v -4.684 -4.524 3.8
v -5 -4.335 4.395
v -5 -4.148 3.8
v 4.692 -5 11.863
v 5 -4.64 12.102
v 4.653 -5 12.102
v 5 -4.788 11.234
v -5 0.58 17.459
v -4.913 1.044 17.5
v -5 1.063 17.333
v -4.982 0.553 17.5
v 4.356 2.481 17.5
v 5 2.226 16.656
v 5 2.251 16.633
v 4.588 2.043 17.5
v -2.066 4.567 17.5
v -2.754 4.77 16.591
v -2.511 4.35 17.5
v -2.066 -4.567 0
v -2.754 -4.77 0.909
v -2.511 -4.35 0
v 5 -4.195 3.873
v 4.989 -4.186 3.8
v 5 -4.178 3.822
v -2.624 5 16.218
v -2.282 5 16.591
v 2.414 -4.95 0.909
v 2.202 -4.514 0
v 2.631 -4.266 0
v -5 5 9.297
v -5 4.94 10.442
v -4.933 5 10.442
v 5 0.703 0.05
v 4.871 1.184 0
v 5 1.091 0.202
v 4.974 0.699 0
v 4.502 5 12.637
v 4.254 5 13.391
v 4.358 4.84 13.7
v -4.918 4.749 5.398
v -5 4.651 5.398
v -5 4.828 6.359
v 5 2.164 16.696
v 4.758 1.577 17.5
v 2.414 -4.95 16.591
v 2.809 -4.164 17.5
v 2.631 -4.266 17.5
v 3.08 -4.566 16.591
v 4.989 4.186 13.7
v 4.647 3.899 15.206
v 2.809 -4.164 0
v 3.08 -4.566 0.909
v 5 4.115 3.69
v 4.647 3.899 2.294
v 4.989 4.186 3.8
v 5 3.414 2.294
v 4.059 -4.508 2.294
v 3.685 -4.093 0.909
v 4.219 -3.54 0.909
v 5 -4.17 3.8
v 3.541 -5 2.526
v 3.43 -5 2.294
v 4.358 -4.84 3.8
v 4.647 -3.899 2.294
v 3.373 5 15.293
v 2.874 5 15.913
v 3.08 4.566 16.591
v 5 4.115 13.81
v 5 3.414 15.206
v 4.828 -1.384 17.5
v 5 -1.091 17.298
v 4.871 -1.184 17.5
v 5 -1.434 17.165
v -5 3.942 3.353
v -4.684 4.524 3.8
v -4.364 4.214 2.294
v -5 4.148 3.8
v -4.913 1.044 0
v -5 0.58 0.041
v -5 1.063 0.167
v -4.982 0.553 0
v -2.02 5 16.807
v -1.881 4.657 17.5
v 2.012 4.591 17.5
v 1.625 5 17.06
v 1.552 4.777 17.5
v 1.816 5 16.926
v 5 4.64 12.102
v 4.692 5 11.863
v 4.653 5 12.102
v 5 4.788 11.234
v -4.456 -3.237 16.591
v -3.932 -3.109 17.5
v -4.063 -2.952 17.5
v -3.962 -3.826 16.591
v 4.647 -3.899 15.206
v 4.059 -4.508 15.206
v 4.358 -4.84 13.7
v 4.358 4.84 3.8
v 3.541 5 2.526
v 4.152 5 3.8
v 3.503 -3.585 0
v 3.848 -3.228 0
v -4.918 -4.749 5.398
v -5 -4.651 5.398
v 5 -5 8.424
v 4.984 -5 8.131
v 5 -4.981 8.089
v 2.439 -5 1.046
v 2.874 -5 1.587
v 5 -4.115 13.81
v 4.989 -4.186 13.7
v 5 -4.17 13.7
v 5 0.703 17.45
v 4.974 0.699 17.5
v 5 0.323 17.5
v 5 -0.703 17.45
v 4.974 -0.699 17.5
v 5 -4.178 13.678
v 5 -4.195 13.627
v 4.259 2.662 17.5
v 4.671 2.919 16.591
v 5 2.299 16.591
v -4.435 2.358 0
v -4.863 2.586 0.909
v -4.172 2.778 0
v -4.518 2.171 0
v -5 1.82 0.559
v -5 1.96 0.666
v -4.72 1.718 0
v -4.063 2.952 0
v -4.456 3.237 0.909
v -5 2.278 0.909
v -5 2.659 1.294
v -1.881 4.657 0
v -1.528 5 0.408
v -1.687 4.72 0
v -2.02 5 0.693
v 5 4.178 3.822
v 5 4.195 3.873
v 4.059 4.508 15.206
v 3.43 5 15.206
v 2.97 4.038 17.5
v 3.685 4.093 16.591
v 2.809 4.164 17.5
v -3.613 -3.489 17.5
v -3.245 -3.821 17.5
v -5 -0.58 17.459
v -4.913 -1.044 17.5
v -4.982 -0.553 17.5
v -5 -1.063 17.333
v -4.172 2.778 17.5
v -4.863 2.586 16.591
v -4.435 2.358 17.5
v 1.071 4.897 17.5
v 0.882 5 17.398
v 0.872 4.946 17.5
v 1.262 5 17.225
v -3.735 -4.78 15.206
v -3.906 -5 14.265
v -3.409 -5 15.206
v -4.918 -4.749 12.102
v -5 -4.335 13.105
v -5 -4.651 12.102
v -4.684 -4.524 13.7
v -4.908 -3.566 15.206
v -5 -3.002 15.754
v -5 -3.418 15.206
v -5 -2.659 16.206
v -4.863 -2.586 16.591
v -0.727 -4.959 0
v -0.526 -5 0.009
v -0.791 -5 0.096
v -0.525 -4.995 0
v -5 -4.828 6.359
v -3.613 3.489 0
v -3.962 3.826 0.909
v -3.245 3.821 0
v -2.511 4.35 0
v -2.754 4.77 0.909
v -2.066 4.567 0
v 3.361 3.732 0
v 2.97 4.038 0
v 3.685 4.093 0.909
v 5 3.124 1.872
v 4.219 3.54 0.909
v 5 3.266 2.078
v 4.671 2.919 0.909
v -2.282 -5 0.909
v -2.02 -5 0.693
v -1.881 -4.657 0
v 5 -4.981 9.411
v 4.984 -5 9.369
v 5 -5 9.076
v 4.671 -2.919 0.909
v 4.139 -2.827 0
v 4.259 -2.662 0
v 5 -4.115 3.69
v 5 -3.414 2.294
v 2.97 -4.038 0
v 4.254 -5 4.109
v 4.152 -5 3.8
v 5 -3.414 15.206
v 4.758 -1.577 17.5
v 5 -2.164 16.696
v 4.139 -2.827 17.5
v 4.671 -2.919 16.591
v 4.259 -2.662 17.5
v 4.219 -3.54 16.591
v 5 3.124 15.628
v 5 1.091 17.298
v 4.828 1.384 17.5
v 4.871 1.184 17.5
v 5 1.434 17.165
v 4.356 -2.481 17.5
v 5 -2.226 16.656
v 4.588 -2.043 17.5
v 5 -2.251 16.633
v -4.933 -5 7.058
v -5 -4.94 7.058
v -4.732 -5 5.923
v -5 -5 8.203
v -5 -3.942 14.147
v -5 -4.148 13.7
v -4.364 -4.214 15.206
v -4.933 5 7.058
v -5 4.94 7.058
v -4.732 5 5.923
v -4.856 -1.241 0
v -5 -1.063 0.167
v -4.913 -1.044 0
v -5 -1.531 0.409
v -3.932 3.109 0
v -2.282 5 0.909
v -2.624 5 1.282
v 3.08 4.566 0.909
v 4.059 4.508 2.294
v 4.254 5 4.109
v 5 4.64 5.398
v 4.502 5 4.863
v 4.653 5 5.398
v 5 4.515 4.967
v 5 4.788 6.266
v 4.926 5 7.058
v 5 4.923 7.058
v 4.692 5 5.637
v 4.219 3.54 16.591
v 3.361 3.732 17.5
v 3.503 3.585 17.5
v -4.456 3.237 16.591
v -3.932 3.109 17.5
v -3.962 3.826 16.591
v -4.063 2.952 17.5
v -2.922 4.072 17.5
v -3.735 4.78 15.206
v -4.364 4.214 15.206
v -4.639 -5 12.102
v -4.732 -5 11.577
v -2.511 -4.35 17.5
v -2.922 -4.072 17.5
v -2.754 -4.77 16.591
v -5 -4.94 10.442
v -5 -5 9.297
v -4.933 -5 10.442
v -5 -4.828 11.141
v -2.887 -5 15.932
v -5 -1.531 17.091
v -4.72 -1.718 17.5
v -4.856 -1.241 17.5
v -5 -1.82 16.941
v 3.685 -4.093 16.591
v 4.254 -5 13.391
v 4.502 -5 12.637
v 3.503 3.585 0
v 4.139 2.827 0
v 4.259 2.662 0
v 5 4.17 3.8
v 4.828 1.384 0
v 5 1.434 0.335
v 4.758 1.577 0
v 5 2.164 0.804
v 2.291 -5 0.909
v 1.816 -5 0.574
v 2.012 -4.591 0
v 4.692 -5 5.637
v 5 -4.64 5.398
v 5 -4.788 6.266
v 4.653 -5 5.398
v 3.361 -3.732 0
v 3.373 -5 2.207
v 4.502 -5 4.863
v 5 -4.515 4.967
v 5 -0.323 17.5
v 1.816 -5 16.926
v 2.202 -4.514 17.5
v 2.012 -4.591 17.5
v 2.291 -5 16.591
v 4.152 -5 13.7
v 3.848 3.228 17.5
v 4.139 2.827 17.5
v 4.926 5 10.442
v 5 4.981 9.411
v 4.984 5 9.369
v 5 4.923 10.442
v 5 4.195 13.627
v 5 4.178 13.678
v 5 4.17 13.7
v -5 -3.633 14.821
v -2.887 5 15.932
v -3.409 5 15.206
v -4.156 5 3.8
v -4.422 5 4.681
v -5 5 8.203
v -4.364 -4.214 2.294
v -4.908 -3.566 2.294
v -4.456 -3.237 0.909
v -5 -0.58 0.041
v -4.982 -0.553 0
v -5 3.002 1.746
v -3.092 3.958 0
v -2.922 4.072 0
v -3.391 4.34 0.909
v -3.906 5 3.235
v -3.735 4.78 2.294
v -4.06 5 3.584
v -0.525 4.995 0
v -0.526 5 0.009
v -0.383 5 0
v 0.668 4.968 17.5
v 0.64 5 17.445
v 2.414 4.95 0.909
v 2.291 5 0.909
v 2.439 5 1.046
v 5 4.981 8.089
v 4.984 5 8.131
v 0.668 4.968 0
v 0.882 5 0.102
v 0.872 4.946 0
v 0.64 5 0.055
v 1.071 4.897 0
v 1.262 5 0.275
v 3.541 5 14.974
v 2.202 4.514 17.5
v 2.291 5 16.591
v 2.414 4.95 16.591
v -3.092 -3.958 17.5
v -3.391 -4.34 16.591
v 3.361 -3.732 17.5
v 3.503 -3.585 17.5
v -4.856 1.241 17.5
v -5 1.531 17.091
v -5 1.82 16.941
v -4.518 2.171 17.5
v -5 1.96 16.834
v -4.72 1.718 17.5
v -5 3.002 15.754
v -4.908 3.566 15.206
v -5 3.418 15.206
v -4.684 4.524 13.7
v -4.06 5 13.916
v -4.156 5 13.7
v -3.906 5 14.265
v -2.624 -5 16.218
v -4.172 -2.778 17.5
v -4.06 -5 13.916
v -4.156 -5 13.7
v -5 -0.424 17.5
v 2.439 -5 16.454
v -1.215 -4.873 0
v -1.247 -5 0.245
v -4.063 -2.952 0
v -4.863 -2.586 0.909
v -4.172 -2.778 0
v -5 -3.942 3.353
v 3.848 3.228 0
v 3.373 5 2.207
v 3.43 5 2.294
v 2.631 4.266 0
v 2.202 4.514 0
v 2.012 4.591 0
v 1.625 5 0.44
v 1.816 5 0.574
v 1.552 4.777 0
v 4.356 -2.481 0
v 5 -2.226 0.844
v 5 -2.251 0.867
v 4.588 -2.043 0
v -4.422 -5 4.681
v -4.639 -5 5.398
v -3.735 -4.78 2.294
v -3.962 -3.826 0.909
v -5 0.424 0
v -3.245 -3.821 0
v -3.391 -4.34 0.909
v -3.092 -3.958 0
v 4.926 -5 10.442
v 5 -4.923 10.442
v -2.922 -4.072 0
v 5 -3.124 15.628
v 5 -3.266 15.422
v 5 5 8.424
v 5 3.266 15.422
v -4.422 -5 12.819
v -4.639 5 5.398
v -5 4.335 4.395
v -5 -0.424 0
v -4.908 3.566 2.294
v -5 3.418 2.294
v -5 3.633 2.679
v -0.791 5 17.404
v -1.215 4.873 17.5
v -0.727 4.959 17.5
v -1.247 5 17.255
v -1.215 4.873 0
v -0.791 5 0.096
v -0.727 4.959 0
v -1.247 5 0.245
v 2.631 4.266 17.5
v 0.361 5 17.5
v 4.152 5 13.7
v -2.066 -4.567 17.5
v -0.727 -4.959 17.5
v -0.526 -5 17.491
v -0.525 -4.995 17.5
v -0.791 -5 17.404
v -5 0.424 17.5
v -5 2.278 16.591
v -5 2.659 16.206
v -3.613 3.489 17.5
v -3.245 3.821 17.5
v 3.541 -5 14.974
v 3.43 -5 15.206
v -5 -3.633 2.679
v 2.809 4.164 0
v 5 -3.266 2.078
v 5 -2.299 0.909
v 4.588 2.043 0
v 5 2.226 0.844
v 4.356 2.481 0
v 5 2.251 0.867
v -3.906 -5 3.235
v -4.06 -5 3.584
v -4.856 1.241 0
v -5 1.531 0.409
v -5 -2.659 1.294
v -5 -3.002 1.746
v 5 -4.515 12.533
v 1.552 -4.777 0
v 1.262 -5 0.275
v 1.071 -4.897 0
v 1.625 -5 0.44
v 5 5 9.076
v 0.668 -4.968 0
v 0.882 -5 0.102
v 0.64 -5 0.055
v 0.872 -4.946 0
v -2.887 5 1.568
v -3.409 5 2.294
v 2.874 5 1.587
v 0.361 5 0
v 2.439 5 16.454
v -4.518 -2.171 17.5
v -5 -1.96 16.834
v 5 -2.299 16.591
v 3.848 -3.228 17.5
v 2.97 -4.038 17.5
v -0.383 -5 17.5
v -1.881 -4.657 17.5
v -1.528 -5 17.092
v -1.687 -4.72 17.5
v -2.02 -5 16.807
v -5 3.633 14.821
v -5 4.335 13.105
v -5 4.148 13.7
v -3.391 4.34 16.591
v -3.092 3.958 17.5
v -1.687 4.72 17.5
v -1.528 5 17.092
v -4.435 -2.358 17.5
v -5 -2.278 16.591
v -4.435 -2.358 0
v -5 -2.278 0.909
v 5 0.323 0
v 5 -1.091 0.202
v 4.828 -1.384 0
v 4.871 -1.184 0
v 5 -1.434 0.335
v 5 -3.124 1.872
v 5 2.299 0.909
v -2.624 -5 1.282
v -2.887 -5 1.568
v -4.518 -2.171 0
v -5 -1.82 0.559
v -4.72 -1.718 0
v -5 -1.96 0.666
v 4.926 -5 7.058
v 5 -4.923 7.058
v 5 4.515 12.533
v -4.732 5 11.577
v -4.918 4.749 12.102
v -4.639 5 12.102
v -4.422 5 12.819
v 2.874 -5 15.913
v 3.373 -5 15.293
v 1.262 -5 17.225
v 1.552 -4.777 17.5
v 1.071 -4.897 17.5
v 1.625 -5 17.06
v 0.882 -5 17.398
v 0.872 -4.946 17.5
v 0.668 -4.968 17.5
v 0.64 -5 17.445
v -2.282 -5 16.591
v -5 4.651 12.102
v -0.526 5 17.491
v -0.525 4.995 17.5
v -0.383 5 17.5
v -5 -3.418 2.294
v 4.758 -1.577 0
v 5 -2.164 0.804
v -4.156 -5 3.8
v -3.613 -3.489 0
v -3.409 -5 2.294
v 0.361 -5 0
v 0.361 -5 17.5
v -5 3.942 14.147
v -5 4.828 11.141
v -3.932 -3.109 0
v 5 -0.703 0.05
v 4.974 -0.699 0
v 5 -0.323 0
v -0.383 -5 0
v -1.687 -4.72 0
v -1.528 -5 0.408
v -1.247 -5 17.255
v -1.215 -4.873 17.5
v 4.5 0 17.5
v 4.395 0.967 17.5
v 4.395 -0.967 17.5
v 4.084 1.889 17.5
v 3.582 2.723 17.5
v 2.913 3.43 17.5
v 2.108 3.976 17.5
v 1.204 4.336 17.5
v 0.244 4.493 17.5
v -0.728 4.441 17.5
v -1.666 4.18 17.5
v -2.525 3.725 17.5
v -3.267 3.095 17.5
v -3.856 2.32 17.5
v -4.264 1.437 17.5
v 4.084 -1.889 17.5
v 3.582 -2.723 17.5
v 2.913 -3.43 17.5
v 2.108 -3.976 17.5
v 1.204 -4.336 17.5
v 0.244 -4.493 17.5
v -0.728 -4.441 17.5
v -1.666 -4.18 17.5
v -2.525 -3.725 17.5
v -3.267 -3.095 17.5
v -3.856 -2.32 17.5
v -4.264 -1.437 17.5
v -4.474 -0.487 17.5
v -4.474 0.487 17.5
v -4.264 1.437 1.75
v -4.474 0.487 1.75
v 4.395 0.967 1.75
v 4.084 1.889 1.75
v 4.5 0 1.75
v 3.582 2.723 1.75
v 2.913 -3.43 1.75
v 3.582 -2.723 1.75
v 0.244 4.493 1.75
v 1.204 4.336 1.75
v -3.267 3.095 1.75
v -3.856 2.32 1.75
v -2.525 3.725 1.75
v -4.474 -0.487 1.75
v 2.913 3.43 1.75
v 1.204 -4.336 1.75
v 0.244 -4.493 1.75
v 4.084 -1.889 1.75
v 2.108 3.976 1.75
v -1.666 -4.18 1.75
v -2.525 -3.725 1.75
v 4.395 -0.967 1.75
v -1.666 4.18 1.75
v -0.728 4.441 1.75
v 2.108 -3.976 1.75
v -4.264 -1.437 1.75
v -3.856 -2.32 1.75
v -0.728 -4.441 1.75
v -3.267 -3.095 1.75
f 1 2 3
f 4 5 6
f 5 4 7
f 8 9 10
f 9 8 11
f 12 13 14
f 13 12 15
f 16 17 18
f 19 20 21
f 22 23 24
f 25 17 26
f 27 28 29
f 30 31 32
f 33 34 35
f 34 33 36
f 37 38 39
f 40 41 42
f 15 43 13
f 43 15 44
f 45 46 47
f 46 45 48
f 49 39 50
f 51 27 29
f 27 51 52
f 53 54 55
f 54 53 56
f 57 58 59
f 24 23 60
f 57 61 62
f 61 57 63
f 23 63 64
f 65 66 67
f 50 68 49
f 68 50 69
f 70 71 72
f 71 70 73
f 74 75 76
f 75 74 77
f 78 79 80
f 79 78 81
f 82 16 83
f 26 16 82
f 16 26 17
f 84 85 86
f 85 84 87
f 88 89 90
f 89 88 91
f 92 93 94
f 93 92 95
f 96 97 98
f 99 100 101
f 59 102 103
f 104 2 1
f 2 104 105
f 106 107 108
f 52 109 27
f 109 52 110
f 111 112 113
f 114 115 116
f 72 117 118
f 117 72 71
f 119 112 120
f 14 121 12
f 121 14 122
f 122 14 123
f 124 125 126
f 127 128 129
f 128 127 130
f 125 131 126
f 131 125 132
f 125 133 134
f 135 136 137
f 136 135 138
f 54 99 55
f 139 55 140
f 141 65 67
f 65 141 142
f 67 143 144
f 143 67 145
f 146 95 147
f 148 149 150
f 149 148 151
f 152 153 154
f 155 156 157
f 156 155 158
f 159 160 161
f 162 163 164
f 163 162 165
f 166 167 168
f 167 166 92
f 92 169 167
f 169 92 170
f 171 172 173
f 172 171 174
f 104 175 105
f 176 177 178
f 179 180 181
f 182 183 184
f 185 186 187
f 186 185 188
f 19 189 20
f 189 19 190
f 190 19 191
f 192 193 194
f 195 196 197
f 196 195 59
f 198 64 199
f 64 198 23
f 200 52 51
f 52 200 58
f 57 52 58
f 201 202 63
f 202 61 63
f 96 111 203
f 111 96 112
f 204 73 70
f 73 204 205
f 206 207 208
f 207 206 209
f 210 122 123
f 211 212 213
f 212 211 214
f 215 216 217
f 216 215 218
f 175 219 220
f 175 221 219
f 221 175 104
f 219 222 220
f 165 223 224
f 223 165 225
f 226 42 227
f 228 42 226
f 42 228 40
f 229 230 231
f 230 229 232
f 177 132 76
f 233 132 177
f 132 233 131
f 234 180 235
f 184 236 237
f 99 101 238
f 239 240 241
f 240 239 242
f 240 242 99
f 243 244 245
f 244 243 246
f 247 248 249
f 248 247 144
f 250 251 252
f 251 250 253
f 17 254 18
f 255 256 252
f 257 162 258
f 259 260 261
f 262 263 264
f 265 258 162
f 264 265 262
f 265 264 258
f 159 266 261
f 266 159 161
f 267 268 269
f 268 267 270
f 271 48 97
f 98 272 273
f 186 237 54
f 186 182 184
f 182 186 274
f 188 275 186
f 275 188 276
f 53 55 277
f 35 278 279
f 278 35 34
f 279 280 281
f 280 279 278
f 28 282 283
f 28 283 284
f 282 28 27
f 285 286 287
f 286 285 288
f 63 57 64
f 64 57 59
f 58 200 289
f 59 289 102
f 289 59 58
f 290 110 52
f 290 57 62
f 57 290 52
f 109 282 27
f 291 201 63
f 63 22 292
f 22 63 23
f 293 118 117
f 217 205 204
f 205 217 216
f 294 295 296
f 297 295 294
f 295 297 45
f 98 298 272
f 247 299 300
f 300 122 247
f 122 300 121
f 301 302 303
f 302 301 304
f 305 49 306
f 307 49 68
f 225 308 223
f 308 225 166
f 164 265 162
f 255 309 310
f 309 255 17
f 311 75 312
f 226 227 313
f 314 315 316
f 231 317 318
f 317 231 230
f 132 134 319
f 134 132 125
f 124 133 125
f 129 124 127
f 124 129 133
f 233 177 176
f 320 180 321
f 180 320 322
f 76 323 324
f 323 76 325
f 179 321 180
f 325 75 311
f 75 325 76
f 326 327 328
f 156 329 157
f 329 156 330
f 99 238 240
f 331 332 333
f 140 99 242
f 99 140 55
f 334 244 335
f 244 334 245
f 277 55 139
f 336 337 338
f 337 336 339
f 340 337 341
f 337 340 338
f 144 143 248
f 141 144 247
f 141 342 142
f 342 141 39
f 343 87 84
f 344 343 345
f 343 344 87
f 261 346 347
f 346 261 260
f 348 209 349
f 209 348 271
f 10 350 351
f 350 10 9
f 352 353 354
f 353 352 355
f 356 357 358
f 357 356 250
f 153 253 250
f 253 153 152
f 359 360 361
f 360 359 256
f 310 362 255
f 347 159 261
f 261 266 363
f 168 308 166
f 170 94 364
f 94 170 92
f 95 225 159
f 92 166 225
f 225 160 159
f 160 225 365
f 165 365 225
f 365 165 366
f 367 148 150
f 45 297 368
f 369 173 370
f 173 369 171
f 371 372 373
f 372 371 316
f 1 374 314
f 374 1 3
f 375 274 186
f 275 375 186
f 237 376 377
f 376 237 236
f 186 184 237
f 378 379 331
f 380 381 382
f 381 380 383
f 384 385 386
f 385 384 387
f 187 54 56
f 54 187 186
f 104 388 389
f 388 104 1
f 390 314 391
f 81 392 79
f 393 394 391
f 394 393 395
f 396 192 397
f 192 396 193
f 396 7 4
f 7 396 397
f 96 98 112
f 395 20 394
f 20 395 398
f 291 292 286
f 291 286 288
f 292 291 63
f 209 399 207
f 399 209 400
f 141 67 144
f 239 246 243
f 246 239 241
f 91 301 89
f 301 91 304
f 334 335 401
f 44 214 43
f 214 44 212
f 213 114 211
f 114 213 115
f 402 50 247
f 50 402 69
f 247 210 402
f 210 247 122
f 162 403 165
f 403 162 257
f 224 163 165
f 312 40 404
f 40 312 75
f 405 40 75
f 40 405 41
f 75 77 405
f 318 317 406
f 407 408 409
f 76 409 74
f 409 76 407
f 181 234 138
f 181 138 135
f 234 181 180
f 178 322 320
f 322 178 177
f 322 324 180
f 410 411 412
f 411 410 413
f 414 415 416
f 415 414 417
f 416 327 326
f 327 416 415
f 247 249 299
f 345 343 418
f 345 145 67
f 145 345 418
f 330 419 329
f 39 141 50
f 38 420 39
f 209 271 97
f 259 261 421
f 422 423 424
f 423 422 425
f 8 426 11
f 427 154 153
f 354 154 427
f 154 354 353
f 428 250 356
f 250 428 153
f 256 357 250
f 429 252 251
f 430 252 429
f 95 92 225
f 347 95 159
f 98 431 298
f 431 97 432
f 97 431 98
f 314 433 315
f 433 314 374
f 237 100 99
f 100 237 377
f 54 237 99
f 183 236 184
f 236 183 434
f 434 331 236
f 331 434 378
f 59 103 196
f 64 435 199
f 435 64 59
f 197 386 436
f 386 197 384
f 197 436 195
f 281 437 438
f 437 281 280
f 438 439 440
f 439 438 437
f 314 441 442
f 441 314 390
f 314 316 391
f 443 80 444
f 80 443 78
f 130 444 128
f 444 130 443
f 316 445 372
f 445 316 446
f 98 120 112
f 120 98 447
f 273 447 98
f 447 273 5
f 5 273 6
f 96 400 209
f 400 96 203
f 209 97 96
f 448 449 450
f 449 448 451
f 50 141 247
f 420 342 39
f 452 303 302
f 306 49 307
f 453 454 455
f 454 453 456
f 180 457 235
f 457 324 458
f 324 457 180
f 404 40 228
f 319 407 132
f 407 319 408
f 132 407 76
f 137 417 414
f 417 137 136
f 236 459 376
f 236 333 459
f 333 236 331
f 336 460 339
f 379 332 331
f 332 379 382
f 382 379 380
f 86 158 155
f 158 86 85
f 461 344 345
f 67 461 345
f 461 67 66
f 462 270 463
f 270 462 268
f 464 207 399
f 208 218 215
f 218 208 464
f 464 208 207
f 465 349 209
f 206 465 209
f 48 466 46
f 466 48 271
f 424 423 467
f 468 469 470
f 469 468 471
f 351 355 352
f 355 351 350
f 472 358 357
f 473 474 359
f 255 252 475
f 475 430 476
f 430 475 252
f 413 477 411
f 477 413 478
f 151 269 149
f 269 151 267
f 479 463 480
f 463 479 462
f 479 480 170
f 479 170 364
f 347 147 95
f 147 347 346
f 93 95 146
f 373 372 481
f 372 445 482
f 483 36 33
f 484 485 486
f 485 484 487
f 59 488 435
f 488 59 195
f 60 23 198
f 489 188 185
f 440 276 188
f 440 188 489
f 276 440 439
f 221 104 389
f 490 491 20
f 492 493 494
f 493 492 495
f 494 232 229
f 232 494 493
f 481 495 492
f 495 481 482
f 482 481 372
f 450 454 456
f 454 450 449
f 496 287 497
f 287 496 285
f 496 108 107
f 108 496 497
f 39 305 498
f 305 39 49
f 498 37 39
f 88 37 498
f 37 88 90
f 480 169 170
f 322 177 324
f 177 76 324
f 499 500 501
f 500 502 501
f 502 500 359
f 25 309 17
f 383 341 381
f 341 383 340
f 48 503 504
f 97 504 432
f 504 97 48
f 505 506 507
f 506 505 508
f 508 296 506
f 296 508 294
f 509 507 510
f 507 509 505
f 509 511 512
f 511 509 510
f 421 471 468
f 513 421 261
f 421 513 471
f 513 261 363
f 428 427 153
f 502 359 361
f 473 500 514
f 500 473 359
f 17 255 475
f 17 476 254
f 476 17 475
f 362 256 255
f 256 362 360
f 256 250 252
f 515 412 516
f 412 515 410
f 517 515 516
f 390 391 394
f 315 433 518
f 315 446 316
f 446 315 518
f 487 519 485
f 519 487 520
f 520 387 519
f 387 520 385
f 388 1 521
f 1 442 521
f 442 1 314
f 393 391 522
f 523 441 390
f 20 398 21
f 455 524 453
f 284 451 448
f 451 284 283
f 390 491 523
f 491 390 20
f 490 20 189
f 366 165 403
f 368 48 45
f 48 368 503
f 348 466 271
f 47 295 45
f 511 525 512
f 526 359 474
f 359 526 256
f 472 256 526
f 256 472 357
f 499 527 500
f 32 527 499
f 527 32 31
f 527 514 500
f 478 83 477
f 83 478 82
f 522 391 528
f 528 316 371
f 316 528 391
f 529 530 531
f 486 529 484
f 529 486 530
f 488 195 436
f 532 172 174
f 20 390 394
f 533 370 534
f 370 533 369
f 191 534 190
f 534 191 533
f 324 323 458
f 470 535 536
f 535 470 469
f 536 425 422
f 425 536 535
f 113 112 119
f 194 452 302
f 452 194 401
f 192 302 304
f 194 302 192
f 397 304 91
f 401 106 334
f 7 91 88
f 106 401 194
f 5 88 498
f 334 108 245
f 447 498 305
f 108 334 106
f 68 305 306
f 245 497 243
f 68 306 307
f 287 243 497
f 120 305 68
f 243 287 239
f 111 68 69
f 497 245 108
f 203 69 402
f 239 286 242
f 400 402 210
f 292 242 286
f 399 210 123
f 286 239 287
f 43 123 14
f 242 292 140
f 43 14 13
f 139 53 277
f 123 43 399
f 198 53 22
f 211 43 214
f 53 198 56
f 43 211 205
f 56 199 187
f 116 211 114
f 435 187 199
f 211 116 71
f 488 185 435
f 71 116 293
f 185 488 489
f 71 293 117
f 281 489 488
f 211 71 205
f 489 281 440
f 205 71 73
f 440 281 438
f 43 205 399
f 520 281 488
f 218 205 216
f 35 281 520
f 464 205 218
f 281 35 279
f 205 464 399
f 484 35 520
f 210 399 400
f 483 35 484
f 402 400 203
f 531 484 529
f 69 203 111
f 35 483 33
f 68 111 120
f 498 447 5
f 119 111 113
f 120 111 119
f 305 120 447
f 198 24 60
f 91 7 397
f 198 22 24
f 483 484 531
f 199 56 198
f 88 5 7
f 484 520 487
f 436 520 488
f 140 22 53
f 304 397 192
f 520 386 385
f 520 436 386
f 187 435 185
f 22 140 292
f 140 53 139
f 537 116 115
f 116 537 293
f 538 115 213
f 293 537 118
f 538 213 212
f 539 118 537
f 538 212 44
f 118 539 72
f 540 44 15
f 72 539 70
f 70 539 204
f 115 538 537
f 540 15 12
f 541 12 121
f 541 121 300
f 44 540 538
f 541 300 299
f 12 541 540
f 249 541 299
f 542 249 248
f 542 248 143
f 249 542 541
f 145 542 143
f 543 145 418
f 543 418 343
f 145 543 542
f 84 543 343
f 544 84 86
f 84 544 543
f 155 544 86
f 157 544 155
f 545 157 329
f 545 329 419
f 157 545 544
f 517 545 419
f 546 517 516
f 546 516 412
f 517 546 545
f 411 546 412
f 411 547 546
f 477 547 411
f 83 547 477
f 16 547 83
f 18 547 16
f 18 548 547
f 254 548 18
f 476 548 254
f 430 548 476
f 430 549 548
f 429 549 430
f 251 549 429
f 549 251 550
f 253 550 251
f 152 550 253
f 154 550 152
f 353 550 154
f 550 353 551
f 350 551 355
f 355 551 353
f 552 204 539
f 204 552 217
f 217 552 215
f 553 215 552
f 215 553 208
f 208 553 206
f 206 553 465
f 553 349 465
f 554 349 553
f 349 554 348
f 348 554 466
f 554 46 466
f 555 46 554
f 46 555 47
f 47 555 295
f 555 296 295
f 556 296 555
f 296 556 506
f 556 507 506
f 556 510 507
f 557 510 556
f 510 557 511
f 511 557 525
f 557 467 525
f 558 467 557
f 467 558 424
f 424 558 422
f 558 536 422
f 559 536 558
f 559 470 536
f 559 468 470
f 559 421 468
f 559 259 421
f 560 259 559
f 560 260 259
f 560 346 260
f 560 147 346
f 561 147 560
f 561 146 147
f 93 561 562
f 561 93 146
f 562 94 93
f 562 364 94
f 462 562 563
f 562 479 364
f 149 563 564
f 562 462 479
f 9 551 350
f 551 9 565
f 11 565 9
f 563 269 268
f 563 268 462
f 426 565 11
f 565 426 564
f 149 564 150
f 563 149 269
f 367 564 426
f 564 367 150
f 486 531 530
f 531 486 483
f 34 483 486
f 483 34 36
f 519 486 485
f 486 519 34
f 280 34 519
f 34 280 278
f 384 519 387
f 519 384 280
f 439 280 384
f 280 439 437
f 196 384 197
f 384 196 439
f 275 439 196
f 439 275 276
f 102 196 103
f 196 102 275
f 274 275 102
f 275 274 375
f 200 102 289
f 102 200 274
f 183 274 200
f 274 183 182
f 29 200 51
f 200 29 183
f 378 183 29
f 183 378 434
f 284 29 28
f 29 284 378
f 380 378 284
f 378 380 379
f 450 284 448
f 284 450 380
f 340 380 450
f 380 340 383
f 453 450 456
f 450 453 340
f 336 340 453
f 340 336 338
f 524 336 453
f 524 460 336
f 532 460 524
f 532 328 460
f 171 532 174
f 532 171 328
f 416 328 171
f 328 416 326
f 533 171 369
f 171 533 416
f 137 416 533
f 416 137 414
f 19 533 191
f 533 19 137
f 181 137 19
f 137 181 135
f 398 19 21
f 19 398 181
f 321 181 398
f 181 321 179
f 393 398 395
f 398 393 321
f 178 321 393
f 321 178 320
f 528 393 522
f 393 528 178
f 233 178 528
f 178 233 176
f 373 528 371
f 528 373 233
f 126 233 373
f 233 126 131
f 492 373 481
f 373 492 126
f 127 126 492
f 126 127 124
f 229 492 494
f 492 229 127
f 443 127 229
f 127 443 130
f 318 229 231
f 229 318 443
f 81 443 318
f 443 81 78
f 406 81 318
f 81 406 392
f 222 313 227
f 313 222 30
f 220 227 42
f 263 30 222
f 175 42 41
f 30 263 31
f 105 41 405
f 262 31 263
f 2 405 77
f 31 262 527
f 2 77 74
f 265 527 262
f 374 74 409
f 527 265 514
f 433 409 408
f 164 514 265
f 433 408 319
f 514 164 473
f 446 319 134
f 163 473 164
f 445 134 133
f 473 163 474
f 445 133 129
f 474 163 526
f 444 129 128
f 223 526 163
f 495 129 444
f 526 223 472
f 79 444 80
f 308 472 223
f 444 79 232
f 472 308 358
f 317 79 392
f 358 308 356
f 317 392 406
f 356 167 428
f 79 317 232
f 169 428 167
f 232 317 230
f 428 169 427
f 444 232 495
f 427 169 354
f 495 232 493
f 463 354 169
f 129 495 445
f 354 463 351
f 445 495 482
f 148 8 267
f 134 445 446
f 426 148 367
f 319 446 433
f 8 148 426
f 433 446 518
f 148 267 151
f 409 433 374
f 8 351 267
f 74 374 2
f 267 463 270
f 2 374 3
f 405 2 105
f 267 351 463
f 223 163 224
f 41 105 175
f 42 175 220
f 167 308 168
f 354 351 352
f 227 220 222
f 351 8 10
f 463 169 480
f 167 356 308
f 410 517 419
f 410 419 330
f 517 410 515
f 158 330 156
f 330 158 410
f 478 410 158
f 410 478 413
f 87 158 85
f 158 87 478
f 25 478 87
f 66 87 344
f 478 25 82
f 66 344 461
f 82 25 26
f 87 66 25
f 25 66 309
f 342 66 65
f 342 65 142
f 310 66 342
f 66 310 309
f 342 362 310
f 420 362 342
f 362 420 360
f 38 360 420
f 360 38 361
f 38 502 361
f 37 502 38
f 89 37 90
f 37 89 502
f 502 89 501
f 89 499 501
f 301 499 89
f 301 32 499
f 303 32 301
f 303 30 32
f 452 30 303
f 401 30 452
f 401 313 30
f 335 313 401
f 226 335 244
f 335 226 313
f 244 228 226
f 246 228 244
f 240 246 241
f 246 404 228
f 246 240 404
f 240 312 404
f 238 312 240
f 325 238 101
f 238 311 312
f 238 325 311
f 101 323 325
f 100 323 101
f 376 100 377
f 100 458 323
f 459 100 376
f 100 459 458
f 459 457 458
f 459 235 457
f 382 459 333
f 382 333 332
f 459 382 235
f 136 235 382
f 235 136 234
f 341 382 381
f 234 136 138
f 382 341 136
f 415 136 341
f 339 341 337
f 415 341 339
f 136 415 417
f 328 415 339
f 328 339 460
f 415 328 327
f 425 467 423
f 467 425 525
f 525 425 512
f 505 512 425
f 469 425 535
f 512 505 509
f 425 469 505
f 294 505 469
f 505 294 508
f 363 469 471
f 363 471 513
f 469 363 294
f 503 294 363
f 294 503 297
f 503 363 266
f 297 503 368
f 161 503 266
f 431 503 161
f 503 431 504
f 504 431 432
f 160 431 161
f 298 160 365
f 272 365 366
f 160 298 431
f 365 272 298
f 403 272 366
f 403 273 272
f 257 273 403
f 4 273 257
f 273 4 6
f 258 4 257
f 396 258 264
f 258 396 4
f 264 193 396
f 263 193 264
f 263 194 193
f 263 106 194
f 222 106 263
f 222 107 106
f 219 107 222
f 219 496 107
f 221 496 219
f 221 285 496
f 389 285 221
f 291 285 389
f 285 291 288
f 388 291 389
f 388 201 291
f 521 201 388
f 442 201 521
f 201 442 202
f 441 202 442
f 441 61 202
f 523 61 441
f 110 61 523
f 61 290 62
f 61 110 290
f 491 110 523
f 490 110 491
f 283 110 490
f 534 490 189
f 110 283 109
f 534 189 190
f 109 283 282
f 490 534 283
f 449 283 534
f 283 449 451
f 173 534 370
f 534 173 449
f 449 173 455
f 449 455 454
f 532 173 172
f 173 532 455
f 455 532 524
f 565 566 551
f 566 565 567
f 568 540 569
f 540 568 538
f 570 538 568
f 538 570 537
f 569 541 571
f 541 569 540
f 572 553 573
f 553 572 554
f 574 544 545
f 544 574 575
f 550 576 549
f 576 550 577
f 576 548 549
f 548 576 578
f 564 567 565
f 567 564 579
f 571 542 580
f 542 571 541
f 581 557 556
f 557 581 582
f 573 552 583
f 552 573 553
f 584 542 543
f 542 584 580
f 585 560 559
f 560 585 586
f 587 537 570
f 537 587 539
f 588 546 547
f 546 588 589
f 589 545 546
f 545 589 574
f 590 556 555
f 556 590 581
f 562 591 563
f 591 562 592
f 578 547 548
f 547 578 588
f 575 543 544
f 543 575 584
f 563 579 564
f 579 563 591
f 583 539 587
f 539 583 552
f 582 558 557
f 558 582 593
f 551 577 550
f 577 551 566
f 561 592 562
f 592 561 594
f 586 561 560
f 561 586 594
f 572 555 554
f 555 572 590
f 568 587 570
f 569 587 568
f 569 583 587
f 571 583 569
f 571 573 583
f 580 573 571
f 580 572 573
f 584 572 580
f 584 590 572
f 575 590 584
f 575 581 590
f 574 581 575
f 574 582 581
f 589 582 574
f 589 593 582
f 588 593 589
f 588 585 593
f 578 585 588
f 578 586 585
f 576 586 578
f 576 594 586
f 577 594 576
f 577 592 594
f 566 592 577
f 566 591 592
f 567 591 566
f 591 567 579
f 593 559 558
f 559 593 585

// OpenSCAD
/*
The code is automatically
generated from [test01.dats]
*/

$fa=0.1; $fs=0.1;

scale([10.00, 10.00, 17.50])
{
  translate([0.00, 0.00, 0.50])
  {
    difference()
    {
      intersection()
      {
        sphere(0.71);
        cube(1.00, center=true);
      }
      translate([0.00, 0.00, 0.10])
      {
        cylinder(h=1.00, r=0.45, center=true);
      }
    }
  }
}

/* end of [test01_dats.scad] */
